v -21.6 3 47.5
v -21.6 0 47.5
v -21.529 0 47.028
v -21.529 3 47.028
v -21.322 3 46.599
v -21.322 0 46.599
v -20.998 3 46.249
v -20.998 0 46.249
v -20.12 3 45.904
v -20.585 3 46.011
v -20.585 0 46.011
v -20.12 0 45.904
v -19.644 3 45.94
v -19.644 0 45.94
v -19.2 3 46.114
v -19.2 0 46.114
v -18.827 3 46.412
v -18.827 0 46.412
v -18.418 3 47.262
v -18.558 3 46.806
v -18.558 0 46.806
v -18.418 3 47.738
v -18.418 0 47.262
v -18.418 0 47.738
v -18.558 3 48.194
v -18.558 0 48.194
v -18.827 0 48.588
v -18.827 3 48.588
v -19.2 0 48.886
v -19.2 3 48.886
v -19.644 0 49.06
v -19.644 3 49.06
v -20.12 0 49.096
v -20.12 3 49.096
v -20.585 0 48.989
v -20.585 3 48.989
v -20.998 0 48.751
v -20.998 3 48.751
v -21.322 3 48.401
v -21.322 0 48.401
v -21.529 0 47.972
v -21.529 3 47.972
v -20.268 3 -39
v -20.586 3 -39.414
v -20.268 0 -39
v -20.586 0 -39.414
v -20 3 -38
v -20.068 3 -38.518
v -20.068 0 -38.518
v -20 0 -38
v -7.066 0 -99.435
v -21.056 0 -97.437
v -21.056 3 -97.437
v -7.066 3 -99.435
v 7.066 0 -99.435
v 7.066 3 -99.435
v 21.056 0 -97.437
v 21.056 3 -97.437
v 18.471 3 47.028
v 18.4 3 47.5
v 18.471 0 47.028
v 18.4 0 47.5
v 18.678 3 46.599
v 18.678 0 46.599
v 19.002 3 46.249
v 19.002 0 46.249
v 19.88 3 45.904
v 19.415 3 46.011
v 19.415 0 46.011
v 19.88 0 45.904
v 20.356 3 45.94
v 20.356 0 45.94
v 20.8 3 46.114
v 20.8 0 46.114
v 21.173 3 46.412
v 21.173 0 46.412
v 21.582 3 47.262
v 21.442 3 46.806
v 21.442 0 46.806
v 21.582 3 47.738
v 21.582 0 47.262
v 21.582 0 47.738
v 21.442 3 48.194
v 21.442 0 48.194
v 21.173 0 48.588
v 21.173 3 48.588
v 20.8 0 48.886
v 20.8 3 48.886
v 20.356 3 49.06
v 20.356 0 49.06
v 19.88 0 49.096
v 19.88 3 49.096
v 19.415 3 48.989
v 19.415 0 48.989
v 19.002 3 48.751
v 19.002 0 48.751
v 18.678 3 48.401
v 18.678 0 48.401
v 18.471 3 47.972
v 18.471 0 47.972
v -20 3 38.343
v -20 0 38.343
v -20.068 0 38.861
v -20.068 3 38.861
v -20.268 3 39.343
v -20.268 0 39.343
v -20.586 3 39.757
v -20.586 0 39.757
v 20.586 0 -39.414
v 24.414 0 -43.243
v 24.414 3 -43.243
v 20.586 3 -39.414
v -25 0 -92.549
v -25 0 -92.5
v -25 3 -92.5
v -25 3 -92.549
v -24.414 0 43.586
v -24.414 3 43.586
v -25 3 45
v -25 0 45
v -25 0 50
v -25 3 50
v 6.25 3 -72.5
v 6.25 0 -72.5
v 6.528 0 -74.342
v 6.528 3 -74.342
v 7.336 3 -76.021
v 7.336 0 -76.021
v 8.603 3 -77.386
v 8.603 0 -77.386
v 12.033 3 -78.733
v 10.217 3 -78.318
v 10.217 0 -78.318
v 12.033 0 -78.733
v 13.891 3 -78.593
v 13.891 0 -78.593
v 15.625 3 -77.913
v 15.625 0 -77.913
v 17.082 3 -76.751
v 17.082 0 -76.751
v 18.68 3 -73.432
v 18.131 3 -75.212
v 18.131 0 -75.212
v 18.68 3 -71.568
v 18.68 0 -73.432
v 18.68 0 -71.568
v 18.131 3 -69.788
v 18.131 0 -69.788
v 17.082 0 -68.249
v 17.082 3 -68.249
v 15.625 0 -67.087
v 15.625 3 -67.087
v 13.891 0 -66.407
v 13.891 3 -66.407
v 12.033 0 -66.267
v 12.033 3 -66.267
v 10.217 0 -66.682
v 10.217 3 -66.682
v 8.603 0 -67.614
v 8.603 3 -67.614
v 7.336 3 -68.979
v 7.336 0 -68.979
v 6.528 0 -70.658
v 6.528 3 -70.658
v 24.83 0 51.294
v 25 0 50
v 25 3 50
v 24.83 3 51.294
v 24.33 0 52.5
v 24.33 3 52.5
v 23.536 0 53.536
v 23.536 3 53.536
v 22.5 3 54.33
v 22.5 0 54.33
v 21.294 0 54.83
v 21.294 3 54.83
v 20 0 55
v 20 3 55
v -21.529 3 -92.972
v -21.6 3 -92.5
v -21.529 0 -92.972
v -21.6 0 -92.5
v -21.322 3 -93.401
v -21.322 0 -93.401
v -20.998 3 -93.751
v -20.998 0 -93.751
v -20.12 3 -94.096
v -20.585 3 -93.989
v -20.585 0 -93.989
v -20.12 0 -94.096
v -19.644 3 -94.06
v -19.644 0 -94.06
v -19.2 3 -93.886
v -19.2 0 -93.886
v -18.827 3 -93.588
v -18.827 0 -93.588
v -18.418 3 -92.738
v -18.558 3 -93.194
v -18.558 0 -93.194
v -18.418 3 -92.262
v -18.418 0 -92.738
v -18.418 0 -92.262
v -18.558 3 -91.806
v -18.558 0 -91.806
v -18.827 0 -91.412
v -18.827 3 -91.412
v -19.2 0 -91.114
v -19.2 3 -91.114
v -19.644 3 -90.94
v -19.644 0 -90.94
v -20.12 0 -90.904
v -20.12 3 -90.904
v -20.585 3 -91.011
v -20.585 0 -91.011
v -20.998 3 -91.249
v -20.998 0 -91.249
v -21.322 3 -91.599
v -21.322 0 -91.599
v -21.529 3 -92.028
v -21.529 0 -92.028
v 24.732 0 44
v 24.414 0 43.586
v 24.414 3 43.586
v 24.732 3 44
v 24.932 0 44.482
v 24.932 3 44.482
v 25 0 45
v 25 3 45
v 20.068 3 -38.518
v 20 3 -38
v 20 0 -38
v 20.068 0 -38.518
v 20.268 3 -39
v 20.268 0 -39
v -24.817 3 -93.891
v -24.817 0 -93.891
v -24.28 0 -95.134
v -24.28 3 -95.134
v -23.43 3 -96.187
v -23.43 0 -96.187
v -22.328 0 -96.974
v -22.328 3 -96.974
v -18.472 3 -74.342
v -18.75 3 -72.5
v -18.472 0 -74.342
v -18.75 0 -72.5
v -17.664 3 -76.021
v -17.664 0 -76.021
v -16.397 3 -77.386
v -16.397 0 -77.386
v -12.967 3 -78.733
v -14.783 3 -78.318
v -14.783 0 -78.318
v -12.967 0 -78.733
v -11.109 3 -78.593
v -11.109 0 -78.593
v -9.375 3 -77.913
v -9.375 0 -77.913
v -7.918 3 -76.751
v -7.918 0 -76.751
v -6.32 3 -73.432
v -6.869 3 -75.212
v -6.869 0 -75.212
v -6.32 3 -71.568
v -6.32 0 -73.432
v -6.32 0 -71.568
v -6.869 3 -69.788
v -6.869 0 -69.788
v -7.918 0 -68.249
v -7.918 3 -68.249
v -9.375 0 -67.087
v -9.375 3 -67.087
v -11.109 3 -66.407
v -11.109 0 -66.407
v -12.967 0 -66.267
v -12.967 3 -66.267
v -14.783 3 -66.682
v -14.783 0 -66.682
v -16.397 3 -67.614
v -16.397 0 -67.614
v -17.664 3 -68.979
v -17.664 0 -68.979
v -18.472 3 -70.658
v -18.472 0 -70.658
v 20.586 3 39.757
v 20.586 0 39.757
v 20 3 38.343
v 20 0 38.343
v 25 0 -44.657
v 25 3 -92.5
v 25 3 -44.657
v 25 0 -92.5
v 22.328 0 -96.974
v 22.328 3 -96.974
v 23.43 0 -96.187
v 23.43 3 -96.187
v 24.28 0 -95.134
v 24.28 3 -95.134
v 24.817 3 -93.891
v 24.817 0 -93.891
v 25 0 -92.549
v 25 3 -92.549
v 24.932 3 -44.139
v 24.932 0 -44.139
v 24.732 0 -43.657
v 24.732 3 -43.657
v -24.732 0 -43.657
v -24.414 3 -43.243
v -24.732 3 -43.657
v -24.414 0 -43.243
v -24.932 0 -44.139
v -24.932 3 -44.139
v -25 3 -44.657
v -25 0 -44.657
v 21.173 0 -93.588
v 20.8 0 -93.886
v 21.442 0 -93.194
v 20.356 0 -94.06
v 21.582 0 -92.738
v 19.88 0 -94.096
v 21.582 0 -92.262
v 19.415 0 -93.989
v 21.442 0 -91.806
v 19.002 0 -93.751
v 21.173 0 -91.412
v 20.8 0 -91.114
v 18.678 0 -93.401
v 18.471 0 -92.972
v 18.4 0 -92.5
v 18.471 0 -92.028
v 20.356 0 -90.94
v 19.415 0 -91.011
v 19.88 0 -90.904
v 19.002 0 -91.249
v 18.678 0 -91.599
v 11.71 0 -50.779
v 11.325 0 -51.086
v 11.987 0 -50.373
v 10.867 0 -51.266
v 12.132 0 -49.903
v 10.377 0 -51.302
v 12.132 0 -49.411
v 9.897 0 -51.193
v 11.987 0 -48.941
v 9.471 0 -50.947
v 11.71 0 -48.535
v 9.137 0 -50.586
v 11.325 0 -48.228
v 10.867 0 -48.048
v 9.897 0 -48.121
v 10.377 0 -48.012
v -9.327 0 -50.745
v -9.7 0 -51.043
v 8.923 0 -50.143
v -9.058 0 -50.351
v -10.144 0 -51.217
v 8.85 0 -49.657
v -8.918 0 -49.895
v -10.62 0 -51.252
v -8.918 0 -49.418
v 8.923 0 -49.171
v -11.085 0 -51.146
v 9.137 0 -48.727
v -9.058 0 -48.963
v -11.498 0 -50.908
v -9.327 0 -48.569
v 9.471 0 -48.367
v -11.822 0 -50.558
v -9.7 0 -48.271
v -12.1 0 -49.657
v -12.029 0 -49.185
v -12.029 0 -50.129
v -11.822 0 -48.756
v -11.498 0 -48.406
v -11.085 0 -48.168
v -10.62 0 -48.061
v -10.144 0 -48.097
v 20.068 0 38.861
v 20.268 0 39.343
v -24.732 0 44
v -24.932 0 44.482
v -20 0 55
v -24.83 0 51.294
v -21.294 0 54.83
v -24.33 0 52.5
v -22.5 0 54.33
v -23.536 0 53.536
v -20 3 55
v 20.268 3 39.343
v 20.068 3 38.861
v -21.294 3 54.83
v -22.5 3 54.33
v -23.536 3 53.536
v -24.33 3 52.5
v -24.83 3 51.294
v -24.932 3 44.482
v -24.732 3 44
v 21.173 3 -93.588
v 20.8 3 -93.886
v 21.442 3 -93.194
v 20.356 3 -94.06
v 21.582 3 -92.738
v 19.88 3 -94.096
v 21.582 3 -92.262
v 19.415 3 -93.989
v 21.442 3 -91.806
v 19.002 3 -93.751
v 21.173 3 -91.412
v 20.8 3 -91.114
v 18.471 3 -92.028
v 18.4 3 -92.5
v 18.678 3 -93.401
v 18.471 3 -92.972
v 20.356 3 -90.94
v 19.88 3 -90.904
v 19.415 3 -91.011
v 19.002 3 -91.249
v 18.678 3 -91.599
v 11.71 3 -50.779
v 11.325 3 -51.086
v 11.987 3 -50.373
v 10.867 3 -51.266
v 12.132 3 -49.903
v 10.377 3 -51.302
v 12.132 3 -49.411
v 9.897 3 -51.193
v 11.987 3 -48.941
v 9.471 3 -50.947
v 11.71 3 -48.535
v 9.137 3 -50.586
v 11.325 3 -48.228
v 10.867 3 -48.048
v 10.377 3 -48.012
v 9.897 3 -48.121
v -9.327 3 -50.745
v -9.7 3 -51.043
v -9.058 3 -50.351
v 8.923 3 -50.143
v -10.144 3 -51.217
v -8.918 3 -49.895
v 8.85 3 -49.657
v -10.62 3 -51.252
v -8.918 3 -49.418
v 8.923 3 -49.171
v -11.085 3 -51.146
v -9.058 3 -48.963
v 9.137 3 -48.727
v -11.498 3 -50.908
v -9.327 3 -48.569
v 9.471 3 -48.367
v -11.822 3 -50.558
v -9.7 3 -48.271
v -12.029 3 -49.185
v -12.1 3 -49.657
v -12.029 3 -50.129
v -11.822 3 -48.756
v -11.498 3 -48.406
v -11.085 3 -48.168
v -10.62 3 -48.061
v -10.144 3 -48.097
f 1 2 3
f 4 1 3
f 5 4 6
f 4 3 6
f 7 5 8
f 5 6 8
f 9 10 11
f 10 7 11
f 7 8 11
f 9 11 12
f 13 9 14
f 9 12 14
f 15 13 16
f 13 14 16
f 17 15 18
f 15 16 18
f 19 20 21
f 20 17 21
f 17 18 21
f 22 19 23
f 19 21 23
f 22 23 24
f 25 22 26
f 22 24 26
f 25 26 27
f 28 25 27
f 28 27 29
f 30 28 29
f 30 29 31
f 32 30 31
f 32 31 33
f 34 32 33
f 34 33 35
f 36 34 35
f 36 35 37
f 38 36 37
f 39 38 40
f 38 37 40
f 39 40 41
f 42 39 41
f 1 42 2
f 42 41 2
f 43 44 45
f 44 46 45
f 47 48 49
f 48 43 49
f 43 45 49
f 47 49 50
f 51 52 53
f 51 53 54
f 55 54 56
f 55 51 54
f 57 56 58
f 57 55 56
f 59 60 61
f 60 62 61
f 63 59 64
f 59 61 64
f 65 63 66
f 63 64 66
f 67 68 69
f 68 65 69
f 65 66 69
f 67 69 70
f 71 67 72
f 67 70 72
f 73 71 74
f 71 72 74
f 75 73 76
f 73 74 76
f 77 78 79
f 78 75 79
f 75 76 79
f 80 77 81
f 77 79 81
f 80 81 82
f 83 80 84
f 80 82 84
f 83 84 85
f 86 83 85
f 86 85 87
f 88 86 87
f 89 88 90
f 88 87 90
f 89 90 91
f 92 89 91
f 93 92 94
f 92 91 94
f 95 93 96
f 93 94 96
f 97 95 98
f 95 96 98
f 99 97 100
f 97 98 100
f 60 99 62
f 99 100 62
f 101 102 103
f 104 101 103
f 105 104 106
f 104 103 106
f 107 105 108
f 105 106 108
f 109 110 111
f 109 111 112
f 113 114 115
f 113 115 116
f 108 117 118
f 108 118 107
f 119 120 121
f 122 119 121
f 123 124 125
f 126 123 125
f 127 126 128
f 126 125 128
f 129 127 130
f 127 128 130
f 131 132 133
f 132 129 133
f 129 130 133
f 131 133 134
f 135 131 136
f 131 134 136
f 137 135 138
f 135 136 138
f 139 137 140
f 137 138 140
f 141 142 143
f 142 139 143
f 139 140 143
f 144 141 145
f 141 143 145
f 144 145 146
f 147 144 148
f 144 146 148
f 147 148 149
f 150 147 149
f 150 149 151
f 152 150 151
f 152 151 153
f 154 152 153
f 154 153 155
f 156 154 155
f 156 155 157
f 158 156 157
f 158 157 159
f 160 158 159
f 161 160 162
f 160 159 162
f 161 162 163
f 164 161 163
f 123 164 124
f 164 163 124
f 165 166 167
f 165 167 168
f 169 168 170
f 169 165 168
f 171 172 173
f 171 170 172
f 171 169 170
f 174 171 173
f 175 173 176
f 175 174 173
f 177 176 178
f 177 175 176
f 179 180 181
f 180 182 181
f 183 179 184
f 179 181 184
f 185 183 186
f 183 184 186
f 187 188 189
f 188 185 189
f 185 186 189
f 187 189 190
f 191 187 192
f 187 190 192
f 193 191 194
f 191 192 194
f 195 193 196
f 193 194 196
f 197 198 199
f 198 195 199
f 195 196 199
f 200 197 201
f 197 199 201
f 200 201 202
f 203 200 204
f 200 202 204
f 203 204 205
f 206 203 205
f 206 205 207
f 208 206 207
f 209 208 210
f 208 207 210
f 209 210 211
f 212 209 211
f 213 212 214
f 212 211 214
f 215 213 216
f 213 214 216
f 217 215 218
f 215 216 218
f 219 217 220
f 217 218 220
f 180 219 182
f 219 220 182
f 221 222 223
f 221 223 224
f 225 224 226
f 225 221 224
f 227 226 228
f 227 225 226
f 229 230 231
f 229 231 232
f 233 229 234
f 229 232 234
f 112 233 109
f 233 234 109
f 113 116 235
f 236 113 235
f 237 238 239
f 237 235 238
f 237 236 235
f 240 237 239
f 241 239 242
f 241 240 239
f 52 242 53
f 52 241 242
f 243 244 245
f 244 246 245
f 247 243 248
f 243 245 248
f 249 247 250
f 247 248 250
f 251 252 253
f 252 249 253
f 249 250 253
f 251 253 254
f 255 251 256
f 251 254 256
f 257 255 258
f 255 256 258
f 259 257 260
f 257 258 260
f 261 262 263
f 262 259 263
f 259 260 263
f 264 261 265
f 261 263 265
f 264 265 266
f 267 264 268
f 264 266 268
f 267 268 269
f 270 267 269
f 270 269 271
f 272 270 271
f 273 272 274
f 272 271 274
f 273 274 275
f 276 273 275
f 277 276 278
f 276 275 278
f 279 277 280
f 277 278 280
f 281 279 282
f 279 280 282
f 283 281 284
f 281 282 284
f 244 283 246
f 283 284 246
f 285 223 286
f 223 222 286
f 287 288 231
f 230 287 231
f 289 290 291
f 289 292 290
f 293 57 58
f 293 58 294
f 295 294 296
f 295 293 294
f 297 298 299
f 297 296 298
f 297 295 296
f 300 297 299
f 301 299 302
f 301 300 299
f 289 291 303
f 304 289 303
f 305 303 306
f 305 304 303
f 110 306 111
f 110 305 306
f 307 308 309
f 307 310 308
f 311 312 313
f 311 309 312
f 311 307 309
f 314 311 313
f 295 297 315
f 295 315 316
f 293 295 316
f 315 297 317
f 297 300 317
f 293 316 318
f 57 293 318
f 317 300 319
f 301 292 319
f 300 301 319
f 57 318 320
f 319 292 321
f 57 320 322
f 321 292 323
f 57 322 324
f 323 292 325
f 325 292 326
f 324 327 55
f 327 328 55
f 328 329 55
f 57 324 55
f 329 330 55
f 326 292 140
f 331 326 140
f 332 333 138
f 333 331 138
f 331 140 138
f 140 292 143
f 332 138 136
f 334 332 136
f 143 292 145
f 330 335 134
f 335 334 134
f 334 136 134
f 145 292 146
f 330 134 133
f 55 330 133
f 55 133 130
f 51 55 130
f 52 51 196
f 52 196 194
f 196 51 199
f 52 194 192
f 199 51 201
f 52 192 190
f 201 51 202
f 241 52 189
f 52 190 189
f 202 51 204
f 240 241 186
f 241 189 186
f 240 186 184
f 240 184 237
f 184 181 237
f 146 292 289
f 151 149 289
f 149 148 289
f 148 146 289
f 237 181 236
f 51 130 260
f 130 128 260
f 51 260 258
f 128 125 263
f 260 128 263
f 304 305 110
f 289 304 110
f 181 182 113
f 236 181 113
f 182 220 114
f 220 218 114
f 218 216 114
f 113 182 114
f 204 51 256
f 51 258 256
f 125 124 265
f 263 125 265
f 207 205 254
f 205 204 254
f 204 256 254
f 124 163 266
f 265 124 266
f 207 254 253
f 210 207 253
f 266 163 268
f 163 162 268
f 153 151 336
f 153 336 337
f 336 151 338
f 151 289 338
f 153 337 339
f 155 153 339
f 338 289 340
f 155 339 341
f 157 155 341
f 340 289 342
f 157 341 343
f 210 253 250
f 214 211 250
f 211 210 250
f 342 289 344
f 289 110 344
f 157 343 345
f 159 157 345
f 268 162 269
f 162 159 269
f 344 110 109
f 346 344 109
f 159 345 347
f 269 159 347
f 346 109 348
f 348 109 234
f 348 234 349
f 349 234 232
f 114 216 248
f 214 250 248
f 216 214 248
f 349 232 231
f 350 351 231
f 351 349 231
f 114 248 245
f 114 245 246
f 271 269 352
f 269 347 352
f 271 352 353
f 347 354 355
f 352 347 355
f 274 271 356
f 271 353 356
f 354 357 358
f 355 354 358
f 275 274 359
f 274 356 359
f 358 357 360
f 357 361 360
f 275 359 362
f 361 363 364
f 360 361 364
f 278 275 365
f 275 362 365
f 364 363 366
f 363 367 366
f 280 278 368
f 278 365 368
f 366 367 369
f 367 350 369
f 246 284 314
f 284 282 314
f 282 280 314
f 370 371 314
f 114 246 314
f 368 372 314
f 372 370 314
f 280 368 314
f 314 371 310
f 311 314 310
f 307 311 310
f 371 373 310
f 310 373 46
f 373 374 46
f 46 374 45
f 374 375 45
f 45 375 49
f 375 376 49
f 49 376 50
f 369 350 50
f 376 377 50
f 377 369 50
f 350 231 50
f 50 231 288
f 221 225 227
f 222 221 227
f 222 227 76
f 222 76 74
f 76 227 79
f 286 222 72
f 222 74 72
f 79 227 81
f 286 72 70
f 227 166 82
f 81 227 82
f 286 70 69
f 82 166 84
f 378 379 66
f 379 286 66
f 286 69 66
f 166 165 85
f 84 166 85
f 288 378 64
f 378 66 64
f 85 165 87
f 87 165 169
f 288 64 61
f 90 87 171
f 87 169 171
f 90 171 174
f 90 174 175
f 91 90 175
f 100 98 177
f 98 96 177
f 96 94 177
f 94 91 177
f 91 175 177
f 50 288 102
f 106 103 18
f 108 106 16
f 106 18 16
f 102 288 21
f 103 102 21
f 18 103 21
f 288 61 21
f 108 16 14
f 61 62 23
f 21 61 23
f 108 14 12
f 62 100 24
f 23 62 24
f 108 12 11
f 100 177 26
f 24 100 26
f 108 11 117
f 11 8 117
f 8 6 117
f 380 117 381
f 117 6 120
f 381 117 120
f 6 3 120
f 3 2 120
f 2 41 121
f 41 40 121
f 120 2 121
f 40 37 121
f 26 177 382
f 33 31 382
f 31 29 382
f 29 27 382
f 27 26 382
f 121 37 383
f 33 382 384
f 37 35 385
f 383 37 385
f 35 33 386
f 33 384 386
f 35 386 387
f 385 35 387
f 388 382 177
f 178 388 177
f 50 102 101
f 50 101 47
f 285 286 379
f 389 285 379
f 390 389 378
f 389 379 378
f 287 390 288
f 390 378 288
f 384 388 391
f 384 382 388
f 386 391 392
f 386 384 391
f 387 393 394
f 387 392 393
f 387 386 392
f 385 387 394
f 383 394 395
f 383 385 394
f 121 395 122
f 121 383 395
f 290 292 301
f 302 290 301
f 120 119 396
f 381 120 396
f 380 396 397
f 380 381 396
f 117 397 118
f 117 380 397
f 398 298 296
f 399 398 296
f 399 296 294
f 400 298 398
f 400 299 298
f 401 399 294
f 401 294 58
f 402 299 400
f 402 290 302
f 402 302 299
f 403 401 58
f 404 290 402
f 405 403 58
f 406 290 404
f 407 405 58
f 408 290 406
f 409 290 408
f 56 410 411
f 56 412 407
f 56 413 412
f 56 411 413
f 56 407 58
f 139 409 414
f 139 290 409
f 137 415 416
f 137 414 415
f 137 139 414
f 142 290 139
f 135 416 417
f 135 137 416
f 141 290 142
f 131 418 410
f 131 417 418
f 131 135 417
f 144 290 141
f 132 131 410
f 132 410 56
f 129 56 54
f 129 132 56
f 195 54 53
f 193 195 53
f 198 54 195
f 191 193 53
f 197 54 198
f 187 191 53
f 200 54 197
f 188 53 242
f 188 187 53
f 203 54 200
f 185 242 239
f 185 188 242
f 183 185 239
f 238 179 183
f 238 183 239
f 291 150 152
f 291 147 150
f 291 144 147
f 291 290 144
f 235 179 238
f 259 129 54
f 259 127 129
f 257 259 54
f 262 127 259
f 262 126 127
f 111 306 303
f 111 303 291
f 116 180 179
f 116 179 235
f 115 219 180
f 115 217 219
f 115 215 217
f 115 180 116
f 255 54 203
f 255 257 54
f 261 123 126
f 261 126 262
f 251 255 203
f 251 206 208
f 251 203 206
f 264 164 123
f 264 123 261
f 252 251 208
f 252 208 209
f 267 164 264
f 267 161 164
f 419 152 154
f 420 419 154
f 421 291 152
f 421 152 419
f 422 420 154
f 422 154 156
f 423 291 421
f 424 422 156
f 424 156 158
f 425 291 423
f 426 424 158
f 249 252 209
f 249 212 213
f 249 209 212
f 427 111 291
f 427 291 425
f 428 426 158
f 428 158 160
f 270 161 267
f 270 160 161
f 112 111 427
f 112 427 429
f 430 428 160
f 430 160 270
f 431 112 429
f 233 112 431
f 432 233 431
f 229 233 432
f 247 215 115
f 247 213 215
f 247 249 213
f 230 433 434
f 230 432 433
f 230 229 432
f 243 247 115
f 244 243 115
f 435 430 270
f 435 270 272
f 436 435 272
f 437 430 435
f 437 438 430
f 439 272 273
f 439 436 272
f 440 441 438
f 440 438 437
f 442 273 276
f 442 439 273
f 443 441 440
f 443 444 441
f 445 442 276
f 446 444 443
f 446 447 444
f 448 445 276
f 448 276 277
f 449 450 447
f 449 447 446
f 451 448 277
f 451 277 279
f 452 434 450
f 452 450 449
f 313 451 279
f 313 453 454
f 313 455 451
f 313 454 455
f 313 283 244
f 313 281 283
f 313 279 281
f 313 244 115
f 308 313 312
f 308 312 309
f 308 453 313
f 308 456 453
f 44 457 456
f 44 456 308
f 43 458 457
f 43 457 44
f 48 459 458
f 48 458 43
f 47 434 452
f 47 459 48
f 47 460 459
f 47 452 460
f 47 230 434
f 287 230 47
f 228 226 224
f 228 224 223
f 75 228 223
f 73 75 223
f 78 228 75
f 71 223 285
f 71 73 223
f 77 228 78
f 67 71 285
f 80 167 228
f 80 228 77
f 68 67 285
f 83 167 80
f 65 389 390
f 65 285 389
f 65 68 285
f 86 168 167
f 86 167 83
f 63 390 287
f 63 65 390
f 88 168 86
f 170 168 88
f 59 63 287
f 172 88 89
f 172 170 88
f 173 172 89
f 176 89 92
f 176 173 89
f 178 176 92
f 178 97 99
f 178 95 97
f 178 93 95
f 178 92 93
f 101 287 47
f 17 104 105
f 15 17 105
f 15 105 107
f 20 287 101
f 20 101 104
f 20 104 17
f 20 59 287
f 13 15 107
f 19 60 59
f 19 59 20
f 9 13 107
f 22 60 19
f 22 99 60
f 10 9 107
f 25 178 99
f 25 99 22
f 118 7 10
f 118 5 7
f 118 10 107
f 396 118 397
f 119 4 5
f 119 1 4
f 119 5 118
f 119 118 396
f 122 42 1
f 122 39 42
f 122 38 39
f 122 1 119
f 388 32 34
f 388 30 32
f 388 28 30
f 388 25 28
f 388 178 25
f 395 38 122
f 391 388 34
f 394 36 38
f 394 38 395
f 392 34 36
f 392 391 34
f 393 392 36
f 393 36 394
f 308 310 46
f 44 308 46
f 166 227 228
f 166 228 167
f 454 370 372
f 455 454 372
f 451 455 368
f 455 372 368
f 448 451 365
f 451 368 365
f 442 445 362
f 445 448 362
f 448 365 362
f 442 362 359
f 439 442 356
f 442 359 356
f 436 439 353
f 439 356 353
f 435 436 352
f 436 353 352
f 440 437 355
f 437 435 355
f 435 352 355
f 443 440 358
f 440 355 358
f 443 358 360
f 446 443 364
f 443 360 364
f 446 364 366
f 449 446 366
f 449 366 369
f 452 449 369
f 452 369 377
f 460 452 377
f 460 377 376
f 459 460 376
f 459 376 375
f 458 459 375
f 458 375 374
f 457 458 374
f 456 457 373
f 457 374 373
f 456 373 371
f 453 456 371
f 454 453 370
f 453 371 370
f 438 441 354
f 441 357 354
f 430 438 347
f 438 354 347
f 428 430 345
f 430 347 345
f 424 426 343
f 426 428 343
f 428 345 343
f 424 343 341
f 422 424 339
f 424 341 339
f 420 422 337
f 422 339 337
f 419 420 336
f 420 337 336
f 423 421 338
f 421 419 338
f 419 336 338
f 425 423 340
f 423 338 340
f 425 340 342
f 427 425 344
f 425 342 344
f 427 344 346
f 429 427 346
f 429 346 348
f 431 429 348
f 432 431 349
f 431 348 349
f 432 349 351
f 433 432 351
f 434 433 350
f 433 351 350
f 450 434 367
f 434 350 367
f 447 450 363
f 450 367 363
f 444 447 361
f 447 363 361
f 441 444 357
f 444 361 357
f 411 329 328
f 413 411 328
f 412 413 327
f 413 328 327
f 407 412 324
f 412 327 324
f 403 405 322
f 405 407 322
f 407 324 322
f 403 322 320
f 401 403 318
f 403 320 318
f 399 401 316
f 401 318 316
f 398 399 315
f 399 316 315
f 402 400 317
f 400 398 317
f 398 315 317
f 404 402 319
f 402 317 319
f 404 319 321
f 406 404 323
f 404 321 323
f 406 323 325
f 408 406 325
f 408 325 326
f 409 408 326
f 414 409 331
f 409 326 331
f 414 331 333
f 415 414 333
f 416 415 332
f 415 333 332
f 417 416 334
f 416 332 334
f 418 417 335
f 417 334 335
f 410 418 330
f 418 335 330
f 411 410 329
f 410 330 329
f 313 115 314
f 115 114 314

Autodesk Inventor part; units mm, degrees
ref_plane "YZ Plane" through (0, 0, 0) normal (1, 0, 0) x (0, 1, 0)
ref_plane "XZ Plane" through (0, 0, 0) normal (0, 1, 0) x (-1, 0, 0)
ref_plane "XY Plane" through (0, 0, 0) normal (0, 0, 1) x (1, 0, 0)
sketch "Sketch1" plane through (0, 0, 0) normal (0, 1, 0) x (-1, 0, 0)
  circle A0 centre (-20, 47.5) radius 1.6
  circle A1 centre (20, 47.5) radius 1.6
  circle A2 centre (-20, -92.5) radius 1.6
  circle A3 centre (20, -92.5) radius 1.6
  line L0 (20, 55) -> (-20, 55)
  line L1 (-25, -92.5) -> (-25, -92.5494)
  line L2 (25, -92.5) -> (25, -92.5494)
  arc A4 (-21.0561, -97.4366) -> (21.0561, -97.4366) centre (0, 0) ccw
  arc A5 (21.0561, -97.4366) -> (25, -92.5494) centre (20, -92.5494) ccw
  arc A6 (-25, -92.5494) -> (-21.0561, -97.4366) centre (-20, -92.5494) ccw
  arc A7 (-20, 55) -> (-25, 50) centre (-20, 50) ccw
  arc A8 (25, 50) -> (20, 55) centre (20, 50) ccw
  circle A9 centre (-10.5, -49.6569) radius 1.65
  circle A10 centre (10.5, -49.6569) radius 1.6
  circle A11 centre (-12.5, -72.5) radius 6.25
  circle A12 centre (12.5, -72.5) radius 6.25
  line L3 (-20, 38.3431) -> (-20, -38)
  line L4 (-24.4142, 43.5858) -> (-20.5858, 39.7574)
  line L5 (-24.4142, -43.2426) -> (-20.5858, -39.4142)
  line L6 (-25, -92.5494) -> (-25, -44.6569)
  line L7 (-25, 45) -> (-25, 50)
  line L8 (20, 38.3431) -> (20, -38)
  line L9 (24.4142, 43.5858) -> (20.5858, 39.7574)
  line L10 (24.4142, -43.2426) -> (20.5858, -39.4142)
  line L11 (25, -92.5494) -> (25, -44.6569)
  line L12 (25, 45) -> (25, 50)
  arc A13 (-25, 45) -> (-24.4142, 43.5858) centre (-23, 45) ccw
  arc A14 (-20, 38.3431) -> (-20.5858, 39.7574) centre (-22, 38.3431) ccw
  arc A15 (-20.5858, -39.4142) -> (-20, -38) centre (-22, -38) ccw
  arc A16 (-24.4142, -43.2426) -> (-25, -44.6569) centre (-23, -44.6569) ccw
  arc A17 (25, -44.6569) -> (24.4142, -43.2426) centre (23, -44.6569) ccw
  arc A18 (20, -38) -> (20.5858, -39.4142) centre (22, -38) ccw
  arc A19 (20.5858, 39.7574) -> (20, 38.3431) centre (22, 38.3431) ccw
  arc A20 (24.4142, 43.5858) -> (25, 45) centre (23, 45) ccw
extrude "Extrusion1" add sketch "Sketch1" along normal blind 3
properties part number "Top Plate" material "Polycarbonate, Clear"
